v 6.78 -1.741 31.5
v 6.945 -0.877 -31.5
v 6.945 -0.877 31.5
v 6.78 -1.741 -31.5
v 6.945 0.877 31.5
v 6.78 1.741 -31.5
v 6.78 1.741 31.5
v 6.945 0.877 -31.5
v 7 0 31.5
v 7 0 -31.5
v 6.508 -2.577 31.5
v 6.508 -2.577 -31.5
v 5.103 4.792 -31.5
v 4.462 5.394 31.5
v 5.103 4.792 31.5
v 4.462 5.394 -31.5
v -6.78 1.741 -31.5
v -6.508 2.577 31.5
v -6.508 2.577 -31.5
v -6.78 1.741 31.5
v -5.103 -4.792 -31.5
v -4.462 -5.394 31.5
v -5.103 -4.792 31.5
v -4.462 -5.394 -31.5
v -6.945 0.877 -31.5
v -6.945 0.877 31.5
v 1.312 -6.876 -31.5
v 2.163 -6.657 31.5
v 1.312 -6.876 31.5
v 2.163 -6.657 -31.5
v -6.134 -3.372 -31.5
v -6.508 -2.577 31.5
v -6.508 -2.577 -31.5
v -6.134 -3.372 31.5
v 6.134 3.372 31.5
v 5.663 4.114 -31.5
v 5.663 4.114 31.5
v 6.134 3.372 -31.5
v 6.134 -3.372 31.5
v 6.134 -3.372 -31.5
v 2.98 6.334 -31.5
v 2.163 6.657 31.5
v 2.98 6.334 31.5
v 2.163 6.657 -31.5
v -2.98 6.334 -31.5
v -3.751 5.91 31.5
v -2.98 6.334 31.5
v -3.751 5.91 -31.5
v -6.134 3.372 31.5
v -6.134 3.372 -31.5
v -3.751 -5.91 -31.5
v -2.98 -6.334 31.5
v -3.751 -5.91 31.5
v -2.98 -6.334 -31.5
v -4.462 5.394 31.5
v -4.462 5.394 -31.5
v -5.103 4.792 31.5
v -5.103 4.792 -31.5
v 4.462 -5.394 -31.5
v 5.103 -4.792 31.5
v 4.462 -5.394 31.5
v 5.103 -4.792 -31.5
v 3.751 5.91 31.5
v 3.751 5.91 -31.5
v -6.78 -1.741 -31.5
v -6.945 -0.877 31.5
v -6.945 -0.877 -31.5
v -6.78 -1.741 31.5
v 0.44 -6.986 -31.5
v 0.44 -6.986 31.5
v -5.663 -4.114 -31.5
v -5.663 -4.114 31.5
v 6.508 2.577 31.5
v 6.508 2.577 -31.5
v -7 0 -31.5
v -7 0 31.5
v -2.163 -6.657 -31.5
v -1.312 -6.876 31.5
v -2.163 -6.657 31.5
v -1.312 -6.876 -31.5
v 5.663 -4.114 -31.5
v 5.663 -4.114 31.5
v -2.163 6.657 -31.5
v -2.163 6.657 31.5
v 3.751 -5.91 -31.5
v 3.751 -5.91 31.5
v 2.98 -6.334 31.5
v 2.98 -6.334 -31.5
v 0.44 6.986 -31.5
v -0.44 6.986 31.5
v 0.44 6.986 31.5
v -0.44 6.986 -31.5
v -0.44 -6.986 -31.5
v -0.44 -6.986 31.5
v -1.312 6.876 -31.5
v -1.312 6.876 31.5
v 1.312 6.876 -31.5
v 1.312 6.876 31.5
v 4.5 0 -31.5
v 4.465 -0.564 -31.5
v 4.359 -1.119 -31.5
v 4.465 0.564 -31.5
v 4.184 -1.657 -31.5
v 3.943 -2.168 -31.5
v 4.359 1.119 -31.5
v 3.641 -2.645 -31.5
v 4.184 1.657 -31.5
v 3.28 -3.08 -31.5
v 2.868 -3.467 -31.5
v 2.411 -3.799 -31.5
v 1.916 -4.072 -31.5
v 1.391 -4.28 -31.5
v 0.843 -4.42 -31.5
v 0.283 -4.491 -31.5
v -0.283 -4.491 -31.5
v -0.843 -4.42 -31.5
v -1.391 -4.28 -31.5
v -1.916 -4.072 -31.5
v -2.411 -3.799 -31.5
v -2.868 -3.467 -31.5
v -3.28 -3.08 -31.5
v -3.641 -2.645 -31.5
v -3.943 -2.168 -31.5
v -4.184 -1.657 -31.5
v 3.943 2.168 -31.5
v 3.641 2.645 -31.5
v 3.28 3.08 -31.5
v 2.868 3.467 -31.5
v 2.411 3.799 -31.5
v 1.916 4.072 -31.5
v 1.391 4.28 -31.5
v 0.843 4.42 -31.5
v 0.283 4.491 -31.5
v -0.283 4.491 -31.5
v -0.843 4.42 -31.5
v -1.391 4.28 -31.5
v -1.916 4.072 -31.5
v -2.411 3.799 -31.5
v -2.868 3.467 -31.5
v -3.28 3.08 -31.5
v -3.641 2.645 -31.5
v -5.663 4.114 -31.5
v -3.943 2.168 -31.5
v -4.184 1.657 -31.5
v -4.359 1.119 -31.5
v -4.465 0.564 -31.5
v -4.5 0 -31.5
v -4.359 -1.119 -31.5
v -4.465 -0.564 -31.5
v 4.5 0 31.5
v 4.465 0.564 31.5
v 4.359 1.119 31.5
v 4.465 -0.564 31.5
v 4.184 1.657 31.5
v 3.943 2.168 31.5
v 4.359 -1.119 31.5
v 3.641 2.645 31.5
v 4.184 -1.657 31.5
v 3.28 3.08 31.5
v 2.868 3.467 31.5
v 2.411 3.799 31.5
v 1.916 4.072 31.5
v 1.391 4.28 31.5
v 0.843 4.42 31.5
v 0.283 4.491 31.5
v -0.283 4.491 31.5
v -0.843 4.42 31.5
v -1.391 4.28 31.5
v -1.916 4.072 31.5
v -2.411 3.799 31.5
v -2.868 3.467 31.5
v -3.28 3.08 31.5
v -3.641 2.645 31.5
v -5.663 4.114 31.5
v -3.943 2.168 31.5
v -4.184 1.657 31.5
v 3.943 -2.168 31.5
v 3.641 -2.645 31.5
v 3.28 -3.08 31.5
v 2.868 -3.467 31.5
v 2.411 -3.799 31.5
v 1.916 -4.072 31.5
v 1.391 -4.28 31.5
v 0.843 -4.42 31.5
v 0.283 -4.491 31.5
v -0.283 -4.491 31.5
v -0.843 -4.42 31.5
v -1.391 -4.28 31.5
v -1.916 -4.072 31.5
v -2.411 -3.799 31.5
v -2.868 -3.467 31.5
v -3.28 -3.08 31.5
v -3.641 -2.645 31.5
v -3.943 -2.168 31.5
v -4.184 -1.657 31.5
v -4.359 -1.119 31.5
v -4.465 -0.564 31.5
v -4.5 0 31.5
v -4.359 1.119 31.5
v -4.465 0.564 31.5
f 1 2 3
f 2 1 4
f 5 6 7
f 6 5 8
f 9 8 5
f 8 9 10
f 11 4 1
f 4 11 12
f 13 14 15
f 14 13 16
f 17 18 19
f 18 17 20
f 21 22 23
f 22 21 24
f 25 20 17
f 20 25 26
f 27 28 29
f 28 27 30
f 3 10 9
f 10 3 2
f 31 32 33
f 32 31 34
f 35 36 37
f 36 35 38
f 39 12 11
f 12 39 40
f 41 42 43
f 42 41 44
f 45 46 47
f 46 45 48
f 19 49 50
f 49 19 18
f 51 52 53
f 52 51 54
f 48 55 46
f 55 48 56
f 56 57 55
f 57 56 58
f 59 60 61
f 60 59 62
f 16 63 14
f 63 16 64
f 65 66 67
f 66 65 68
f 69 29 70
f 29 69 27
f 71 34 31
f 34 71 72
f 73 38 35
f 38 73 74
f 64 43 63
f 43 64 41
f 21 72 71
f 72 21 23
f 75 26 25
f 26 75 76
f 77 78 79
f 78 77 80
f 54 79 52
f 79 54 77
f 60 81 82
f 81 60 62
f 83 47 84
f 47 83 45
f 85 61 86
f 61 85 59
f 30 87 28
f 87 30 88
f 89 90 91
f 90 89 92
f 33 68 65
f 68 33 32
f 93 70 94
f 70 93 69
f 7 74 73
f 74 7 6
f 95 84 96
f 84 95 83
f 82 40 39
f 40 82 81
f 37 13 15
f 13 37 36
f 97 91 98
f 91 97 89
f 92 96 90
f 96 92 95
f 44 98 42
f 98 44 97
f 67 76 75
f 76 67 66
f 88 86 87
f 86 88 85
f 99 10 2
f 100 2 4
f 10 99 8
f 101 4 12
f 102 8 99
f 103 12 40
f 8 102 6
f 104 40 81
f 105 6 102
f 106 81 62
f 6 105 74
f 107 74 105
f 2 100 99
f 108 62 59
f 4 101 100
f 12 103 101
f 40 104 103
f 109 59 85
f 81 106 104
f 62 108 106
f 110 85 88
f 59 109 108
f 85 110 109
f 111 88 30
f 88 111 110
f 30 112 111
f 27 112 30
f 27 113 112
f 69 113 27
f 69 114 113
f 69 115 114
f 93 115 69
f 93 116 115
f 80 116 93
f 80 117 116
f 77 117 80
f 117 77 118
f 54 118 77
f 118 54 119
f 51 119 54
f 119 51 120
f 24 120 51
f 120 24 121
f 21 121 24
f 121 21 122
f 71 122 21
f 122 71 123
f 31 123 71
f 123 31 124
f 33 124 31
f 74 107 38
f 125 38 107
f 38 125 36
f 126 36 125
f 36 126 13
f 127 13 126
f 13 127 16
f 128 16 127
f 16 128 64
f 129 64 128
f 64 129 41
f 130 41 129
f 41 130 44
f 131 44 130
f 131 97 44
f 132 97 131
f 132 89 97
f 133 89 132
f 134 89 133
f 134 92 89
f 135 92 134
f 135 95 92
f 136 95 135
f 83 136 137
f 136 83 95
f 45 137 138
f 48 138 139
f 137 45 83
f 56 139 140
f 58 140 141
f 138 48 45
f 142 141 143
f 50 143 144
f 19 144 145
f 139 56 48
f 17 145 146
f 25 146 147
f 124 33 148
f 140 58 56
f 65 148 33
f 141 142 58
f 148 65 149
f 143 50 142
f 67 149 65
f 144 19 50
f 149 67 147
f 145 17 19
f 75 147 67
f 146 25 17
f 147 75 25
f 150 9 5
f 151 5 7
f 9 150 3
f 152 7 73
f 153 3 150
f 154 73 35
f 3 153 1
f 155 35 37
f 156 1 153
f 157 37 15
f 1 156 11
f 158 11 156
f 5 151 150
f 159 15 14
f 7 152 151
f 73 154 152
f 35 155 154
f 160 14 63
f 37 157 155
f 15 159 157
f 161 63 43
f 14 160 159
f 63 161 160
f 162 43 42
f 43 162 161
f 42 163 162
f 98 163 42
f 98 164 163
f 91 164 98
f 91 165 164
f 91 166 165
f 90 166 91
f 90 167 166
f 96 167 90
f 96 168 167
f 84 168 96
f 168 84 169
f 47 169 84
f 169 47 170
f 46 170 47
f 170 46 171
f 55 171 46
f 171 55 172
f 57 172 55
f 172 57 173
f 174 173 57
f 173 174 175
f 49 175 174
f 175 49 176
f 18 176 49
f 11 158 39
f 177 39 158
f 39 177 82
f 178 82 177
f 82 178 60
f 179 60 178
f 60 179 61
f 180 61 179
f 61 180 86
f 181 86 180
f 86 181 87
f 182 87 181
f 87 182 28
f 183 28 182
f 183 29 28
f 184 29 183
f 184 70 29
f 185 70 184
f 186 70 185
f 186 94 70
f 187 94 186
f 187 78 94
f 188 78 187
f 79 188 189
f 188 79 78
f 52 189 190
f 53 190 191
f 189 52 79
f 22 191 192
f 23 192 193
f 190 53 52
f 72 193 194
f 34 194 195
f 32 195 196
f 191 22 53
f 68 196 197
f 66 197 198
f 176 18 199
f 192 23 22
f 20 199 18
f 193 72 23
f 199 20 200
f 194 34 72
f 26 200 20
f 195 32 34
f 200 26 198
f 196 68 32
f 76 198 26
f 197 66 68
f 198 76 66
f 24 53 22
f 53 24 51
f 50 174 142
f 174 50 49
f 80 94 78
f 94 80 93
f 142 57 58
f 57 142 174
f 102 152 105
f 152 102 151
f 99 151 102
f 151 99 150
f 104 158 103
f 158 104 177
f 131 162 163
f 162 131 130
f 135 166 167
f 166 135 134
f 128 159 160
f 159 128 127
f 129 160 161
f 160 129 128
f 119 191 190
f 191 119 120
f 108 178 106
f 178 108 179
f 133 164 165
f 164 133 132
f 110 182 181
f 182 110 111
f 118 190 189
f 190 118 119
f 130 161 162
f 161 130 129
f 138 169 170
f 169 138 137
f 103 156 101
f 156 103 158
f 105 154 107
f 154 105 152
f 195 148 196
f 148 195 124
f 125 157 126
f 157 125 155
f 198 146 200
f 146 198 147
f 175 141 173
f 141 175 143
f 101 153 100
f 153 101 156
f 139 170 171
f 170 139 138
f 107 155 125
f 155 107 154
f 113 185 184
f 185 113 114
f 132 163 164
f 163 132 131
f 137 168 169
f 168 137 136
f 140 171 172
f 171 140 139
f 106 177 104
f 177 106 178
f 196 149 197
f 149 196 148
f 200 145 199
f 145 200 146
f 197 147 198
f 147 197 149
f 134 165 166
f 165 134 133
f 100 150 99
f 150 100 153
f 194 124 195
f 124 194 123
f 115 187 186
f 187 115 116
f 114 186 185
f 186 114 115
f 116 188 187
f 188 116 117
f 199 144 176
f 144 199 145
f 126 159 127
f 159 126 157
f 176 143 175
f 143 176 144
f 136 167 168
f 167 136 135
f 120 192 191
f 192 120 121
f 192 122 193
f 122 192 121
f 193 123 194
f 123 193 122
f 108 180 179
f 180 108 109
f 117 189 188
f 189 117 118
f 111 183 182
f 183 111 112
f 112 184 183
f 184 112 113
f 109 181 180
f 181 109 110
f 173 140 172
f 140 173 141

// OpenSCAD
$fn = 50;


difference() {
	union() {
		translate(v = [0, 0, -31.5000000000]) {
			cylinder(h = 63, r = 7.0000000000);
		}
	}
	union() {
		translate(v = [0, 0, -100.0000000000]) {
			cylinder(h = 200, r = 4.5000000000);
		}
	}
}
